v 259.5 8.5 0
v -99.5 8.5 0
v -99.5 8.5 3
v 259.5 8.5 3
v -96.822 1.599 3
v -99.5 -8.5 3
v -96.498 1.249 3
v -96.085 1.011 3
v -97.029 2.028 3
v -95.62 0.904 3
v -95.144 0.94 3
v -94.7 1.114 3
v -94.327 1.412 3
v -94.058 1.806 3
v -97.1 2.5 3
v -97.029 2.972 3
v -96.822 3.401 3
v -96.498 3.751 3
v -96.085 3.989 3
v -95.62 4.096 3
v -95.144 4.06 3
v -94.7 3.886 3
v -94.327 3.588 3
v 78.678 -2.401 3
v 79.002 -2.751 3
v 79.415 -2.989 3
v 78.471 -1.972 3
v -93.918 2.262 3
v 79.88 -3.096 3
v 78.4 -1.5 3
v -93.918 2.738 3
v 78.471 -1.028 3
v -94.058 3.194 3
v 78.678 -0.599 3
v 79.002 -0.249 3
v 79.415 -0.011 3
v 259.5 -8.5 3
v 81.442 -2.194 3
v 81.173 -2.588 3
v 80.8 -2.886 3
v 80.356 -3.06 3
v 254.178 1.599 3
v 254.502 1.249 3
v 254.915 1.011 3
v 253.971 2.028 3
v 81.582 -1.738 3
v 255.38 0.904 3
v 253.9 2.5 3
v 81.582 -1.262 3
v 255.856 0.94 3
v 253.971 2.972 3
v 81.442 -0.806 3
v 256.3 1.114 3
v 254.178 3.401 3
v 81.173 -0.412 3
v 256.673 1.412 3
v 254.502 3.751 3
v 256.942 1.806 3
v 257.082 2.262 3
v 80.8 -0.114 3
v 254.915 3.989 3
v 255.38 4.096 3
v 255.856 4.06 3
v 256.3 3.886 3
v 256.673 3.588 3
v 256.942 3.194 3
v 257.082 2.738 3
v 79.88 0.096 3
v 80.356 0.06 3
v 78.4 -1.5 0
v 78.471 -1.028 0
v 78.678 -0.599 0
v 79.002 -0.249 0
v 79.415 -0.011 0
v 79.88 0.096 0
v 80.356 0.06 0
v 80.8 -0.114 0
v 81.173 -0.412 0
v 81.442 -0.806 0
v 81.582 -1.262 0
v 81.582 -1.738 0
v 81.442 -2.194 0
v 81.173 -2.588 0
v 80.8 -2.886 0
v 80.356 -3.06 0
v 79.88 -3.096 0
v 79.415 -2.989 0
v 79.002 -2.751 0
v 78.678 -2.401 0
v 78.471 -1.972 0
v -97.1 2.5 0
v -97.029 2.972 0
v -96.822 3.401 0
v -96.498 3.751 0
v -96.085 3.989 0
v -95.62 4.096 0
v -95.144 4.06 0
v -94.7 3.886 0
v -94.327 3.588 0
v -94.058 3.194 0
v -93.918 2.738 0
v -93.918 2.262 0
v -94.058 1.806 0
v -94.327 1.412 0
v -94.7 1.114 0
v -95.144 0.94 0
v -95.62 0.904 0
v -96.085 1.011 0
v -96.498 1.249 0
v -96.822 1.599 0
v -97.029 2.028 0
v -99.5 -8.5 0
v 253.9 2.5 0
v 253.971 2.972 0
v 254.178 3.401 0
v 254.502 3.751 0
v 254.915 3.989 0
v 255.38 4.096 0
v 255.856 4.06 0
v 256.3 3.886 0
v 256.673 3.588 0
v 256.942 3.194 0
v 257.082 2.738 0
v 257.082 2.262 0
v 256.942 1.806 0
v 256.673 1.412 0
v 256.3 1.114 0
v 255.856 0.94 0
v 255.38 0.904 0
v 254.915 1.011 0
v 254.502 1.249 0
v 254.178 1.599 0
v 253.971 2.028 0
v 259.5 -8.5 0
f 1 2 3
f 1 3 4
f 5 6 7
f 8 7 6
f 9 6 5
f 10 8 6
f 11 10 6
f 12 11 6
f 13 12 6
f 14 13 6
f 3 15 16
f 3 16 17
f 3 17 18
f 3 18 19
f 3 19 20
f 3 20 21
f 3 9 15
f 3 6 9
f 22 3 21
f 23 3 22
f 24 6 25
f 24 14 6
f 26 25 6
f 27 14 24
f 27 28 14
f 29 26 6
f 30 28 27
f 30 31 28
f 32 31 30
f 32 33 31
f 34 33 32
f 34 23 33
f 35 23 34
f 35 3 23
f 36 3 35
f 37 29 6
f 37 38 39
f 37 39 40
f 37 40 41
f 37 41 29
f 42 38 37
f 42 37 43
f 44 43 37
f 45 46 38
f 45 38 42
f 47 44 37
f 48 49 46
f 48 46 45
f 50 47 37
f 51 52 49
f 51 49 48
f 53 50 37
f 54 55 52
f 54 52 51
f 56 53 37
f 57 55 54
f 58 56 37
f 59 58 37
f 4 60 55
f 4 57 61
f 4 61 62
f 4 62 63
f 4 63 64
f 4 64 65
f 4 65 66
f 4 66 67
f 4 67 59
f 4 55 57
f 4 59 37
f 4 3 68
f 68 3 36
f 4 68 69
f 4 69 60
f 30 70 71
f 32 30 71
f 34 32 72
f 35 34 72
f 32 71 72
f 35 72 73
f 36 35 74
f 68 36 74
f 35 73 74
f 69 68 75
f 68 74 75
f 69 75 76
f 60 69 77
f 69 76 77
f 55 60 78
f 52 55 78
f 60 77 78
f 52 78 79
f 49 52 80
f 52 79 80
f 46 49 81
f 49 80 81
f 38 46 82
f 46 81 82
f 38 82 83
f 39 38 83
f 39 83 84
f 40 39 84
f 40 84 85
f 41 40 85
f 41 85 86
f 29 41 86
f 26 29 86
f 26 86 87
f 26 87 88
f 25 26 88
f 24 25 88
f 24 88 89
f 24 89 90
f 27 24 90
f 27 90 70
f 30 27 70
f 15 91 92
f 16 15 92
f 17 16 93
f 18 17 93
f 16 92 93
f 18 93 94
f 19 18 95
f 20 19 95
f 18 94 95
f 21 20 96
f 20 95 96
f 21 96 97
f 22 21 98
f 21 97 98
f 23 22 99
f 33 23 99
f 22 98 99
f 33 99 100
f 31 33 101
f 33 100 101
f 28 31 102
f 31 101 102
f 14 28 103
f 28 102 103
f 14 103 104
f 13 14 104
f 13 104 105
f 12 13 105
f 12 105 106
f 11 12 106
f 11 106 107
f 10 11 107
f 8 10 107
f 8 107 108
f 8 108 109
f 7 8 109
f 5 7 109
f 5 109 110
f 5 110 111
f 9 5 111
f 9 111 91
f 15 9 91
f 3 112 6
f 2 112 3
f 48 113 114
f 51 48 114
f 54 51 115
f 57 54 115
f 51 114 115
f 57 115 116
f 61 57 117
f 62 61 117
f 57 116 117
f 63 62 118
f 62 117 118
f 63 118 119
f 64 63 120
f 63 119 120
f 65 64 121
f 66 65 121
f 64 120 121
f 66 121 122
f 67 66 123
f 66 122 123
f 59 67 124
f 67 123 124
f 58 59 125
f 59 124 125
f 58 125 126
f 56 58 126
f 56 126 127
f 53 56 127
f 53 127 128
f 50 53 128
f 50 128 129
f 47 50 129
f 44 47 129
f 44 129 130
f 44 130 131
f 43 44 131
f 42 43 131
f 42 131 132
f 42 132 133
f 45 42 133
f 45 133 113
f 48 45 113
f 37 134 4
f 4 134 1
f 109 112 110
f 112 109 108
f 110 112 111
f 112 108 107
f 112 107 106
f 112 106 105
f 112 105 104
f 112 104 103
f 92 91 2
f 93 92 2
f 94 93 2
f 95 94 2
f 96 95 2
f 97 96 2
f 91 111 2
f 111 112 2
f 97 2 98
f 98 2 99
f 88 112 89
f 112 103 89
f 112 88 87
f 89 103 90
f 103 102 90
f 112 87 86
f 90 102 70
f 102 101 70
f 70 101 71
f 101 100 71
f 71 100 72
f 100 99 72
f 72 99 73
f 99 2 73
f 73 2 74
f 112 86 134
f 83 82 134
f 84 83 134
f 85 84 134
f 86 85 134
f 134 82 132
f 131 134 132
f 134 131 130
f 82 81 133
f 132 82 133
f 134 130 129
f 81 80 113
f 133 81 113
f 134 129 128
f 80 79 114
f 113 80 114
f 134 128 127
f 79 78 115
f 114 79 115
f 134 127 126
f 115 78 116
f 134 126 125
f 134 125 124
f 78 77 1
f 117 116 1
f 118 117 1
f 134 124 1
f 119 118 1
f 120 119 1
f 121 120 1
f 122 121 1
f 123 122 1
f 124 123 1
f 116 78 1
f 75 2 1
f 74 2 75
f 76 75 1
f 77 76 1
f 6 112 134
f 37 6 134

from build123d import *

# Parameters (mm, degrees)
ESQUISSE1_W        = 359
ESQUISSE1_H        = 17
BOSS_EXTRU_1_DEPTH = 3
SKETCH1_R          = 1.6
CUT_EXTRUDE1_DEPTH = 260.656503866
SKETCH2_R          = 1.6
CUT_EXTRUDE2_DEPTH = 260.656503866
SKETCH3_R          = 1.6
CUT_EXTRUDE3_DEPTH = 260.656503866


with BuildPart() as part:
    # Esquisse1 → Boss.-Extru.1 (new body)
    with BuildSketch(Plane.XY):
        with Locations((80, 0)):
            Rectangle(ESQUISSE1_W, ESQUISSE1_H)
    extrude(amount=BOSS_EXTRU_1_DEPTH)

    # Sketch1 → Cut-Extrude1 (cut, through all)
    with BuildSketch(Plane(origin=(0, 0, 0), x_dir=(-1, 0, 0), z_dir=(0, 0, -1))):
        with Locations((95.5, 2.5)):
            Circle(SKETCH1_R)
    extrude(amount=-CUT_EXTRUDE1_DEPTH, mode=Mode.SUBTRACT)

    # Sketch2 → Cut-Extrude2 (cut, through all)
    with BuildSketch(Plane(origin=(0, 0, 0), x_dir=(-1, 0, 0), z_dir=(0, 0, -1))):
        with Locations((-255.5, 2.5)):
            Circle(SKETCH2_R)
    extrude(amount=-CUT_EXTRUDE2_DEPTH, mode=Mode.SUBTRACT)

    # Sketch3 → Cut-Extrude3 (cut, through all)
    with BuildSketch(Plane(origin=(0, 0, 0), x_dir=(-1, 0, 0), z_dir=(0, 0, -1))):
        with Locations((-80, -1.5)):
            Circle(SKETCH3_R)
    extrude(amount=-CUT_EXTRUDE3_DEPTH, mode=Mode.SUBTRACT)


solid = part.part
